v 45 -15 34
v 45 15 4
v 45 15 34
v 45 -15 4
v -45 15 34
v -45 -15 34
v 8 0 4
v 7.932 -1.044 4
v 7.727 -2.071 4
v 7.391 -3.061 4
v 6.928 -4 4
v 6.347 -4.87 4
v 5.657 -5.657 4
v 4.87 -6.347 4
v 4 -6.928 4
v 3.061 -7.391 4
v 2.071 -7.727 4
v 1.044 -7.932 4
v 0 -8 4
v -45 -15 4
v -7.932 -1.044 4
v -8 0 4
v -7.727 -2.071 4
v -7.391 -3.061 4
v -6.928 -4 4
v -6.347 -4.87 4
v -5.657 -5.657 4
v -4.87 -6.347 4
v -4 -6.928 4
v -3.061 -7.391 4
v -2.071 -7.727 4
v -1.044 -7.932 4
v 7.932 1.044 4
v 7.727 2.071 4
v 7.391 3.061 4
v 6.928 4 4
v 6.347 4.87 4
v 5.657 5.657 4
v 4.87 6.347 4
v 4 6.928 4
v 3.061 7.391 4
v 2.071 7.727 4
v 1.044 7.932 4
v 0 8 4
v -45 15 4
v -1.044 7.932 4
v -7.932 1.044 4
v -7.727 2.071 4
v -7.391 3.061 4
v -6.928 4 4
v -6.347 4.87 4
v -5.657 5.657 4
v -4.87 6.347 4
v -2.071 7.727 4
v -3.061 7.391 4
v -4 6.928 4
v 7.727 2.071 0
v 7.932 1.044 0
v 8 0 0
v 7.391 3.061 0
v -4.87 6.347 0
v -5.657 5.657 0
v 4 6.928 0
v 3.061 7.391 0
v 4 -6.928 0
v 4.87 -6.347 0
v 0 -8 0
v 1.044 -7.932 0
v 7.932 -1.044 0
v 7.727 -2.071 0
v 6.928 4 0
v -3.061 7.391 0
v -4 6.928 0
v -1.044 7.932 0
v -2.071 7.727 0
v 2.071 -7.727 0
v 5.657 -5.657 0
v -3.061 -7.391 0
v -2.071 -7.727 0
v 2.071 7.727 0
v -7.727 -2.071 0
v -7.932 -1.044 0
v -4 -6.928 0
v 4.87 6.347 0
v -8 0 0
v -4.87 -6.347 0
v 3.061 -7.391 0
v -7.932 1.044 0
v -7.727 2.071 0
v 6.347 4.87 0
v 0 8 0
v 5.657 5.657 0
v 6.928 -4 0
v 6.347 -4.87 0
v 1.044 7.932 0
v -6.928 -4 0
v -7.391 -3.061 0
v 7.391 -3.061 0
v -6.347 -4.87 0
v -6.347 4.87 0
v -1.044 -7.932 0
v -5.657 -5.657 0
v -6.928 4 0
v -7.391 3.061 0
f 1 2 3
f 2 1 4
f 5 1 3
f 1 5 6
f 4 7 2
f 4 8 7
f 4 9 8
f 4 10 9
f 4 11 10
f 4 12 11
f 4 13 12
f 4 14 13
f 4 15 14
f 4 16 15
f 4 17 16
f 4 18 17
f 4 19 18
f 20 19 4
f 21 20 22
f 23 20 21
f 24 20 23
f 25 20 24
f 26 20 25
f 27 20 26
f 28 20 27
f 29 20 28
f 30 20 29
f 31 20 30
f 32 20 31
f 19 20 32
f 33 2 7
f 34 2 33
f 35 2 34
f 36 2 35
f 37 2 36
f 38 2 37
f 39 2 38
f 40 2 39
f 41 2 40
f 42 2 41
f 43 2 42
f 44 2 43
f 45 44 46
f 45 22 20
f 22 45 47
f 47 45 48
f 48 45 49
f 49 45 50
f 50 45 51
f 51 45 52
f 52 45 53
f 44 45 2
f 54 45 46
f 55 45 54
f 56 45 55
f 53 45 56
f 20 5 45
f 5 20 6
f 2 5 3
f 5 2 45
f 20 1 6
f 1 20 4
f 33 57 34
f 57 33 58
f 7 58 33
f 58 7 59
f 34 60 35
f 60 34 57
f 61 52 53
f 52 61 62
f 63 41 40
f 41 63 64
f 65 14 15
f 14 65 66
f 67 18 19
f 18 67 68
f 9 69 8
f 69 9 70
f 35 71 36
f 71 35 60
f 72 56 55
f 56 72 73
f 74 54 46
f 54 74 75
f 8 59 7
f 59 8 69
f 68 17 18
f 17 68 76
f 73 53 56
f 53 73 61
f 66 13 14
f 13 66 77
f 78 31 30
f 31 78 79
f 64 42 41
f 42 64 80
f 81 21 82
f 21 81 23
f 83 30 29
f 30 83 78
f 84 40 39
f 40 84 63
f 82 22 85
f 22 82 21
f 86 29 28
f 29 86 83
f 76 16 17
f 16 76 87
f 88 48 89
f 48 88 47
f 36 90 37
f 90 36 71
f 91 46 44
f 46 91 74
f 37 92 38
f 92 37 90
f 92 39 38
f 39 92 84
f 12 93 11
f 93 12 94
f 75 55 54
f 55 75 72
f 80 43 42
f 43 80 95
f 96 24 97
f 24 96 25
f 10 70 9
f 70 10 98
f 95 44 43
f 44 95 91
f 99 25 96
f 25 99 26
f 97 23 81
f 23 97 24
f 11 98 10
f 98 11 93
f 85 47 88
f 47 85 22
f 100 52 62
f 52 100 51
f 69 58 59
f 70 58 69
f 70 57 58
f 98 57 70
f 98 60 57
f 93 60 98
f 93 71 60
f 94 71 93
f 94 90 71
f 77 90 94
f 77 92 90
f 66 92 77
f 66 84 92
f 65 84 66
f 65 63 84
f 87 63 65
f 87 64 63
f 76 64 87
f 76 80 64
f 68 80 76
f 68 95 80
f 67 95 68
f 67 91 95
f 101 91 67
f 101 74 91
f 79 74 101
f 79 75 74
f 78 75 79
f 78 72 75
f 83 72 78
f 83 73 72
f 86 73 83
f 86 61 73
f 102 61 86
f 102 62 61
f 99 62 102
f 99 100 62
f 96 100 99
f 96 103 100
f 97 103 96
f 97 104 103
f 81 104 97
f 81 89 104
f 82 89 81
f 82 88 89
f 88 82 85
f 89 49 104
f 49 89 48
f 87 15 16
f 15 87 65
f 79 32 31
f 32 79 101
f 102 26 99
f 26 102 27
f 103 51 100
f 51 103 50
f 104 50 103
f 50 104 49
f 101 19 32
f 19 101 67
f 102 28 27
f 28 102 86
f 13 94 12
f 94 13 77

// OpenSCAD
// A bare webcam: a body and its lens, nothing to stand it on. Drawn looking
// straight down, as a camera added to a site first stands: the middle of the
// lens's front face is the origin, at z = 0, and the body is above it. Its
// long side runs across the picture it takes (+x); the picture's top is +y.
// A camera in a site is this, tilted from straight down about its long side
// and turned about the vertical (apothecary/vision/cameras.py).

body = [90, 30, 30];   // across the picture, up the picture, lens to back
lens_d = 16;           // the lens's diameter
lens_h = 4;            // how far the lens stands out of the body

module webcam() {
    color("dimgray") translate([-body[0] / 2, -body[1] / 2, lens_h]) cube(body);
    color("black") cylinder(d = lens_d, h = lens_h, $fn = 48);
}

webcam();
